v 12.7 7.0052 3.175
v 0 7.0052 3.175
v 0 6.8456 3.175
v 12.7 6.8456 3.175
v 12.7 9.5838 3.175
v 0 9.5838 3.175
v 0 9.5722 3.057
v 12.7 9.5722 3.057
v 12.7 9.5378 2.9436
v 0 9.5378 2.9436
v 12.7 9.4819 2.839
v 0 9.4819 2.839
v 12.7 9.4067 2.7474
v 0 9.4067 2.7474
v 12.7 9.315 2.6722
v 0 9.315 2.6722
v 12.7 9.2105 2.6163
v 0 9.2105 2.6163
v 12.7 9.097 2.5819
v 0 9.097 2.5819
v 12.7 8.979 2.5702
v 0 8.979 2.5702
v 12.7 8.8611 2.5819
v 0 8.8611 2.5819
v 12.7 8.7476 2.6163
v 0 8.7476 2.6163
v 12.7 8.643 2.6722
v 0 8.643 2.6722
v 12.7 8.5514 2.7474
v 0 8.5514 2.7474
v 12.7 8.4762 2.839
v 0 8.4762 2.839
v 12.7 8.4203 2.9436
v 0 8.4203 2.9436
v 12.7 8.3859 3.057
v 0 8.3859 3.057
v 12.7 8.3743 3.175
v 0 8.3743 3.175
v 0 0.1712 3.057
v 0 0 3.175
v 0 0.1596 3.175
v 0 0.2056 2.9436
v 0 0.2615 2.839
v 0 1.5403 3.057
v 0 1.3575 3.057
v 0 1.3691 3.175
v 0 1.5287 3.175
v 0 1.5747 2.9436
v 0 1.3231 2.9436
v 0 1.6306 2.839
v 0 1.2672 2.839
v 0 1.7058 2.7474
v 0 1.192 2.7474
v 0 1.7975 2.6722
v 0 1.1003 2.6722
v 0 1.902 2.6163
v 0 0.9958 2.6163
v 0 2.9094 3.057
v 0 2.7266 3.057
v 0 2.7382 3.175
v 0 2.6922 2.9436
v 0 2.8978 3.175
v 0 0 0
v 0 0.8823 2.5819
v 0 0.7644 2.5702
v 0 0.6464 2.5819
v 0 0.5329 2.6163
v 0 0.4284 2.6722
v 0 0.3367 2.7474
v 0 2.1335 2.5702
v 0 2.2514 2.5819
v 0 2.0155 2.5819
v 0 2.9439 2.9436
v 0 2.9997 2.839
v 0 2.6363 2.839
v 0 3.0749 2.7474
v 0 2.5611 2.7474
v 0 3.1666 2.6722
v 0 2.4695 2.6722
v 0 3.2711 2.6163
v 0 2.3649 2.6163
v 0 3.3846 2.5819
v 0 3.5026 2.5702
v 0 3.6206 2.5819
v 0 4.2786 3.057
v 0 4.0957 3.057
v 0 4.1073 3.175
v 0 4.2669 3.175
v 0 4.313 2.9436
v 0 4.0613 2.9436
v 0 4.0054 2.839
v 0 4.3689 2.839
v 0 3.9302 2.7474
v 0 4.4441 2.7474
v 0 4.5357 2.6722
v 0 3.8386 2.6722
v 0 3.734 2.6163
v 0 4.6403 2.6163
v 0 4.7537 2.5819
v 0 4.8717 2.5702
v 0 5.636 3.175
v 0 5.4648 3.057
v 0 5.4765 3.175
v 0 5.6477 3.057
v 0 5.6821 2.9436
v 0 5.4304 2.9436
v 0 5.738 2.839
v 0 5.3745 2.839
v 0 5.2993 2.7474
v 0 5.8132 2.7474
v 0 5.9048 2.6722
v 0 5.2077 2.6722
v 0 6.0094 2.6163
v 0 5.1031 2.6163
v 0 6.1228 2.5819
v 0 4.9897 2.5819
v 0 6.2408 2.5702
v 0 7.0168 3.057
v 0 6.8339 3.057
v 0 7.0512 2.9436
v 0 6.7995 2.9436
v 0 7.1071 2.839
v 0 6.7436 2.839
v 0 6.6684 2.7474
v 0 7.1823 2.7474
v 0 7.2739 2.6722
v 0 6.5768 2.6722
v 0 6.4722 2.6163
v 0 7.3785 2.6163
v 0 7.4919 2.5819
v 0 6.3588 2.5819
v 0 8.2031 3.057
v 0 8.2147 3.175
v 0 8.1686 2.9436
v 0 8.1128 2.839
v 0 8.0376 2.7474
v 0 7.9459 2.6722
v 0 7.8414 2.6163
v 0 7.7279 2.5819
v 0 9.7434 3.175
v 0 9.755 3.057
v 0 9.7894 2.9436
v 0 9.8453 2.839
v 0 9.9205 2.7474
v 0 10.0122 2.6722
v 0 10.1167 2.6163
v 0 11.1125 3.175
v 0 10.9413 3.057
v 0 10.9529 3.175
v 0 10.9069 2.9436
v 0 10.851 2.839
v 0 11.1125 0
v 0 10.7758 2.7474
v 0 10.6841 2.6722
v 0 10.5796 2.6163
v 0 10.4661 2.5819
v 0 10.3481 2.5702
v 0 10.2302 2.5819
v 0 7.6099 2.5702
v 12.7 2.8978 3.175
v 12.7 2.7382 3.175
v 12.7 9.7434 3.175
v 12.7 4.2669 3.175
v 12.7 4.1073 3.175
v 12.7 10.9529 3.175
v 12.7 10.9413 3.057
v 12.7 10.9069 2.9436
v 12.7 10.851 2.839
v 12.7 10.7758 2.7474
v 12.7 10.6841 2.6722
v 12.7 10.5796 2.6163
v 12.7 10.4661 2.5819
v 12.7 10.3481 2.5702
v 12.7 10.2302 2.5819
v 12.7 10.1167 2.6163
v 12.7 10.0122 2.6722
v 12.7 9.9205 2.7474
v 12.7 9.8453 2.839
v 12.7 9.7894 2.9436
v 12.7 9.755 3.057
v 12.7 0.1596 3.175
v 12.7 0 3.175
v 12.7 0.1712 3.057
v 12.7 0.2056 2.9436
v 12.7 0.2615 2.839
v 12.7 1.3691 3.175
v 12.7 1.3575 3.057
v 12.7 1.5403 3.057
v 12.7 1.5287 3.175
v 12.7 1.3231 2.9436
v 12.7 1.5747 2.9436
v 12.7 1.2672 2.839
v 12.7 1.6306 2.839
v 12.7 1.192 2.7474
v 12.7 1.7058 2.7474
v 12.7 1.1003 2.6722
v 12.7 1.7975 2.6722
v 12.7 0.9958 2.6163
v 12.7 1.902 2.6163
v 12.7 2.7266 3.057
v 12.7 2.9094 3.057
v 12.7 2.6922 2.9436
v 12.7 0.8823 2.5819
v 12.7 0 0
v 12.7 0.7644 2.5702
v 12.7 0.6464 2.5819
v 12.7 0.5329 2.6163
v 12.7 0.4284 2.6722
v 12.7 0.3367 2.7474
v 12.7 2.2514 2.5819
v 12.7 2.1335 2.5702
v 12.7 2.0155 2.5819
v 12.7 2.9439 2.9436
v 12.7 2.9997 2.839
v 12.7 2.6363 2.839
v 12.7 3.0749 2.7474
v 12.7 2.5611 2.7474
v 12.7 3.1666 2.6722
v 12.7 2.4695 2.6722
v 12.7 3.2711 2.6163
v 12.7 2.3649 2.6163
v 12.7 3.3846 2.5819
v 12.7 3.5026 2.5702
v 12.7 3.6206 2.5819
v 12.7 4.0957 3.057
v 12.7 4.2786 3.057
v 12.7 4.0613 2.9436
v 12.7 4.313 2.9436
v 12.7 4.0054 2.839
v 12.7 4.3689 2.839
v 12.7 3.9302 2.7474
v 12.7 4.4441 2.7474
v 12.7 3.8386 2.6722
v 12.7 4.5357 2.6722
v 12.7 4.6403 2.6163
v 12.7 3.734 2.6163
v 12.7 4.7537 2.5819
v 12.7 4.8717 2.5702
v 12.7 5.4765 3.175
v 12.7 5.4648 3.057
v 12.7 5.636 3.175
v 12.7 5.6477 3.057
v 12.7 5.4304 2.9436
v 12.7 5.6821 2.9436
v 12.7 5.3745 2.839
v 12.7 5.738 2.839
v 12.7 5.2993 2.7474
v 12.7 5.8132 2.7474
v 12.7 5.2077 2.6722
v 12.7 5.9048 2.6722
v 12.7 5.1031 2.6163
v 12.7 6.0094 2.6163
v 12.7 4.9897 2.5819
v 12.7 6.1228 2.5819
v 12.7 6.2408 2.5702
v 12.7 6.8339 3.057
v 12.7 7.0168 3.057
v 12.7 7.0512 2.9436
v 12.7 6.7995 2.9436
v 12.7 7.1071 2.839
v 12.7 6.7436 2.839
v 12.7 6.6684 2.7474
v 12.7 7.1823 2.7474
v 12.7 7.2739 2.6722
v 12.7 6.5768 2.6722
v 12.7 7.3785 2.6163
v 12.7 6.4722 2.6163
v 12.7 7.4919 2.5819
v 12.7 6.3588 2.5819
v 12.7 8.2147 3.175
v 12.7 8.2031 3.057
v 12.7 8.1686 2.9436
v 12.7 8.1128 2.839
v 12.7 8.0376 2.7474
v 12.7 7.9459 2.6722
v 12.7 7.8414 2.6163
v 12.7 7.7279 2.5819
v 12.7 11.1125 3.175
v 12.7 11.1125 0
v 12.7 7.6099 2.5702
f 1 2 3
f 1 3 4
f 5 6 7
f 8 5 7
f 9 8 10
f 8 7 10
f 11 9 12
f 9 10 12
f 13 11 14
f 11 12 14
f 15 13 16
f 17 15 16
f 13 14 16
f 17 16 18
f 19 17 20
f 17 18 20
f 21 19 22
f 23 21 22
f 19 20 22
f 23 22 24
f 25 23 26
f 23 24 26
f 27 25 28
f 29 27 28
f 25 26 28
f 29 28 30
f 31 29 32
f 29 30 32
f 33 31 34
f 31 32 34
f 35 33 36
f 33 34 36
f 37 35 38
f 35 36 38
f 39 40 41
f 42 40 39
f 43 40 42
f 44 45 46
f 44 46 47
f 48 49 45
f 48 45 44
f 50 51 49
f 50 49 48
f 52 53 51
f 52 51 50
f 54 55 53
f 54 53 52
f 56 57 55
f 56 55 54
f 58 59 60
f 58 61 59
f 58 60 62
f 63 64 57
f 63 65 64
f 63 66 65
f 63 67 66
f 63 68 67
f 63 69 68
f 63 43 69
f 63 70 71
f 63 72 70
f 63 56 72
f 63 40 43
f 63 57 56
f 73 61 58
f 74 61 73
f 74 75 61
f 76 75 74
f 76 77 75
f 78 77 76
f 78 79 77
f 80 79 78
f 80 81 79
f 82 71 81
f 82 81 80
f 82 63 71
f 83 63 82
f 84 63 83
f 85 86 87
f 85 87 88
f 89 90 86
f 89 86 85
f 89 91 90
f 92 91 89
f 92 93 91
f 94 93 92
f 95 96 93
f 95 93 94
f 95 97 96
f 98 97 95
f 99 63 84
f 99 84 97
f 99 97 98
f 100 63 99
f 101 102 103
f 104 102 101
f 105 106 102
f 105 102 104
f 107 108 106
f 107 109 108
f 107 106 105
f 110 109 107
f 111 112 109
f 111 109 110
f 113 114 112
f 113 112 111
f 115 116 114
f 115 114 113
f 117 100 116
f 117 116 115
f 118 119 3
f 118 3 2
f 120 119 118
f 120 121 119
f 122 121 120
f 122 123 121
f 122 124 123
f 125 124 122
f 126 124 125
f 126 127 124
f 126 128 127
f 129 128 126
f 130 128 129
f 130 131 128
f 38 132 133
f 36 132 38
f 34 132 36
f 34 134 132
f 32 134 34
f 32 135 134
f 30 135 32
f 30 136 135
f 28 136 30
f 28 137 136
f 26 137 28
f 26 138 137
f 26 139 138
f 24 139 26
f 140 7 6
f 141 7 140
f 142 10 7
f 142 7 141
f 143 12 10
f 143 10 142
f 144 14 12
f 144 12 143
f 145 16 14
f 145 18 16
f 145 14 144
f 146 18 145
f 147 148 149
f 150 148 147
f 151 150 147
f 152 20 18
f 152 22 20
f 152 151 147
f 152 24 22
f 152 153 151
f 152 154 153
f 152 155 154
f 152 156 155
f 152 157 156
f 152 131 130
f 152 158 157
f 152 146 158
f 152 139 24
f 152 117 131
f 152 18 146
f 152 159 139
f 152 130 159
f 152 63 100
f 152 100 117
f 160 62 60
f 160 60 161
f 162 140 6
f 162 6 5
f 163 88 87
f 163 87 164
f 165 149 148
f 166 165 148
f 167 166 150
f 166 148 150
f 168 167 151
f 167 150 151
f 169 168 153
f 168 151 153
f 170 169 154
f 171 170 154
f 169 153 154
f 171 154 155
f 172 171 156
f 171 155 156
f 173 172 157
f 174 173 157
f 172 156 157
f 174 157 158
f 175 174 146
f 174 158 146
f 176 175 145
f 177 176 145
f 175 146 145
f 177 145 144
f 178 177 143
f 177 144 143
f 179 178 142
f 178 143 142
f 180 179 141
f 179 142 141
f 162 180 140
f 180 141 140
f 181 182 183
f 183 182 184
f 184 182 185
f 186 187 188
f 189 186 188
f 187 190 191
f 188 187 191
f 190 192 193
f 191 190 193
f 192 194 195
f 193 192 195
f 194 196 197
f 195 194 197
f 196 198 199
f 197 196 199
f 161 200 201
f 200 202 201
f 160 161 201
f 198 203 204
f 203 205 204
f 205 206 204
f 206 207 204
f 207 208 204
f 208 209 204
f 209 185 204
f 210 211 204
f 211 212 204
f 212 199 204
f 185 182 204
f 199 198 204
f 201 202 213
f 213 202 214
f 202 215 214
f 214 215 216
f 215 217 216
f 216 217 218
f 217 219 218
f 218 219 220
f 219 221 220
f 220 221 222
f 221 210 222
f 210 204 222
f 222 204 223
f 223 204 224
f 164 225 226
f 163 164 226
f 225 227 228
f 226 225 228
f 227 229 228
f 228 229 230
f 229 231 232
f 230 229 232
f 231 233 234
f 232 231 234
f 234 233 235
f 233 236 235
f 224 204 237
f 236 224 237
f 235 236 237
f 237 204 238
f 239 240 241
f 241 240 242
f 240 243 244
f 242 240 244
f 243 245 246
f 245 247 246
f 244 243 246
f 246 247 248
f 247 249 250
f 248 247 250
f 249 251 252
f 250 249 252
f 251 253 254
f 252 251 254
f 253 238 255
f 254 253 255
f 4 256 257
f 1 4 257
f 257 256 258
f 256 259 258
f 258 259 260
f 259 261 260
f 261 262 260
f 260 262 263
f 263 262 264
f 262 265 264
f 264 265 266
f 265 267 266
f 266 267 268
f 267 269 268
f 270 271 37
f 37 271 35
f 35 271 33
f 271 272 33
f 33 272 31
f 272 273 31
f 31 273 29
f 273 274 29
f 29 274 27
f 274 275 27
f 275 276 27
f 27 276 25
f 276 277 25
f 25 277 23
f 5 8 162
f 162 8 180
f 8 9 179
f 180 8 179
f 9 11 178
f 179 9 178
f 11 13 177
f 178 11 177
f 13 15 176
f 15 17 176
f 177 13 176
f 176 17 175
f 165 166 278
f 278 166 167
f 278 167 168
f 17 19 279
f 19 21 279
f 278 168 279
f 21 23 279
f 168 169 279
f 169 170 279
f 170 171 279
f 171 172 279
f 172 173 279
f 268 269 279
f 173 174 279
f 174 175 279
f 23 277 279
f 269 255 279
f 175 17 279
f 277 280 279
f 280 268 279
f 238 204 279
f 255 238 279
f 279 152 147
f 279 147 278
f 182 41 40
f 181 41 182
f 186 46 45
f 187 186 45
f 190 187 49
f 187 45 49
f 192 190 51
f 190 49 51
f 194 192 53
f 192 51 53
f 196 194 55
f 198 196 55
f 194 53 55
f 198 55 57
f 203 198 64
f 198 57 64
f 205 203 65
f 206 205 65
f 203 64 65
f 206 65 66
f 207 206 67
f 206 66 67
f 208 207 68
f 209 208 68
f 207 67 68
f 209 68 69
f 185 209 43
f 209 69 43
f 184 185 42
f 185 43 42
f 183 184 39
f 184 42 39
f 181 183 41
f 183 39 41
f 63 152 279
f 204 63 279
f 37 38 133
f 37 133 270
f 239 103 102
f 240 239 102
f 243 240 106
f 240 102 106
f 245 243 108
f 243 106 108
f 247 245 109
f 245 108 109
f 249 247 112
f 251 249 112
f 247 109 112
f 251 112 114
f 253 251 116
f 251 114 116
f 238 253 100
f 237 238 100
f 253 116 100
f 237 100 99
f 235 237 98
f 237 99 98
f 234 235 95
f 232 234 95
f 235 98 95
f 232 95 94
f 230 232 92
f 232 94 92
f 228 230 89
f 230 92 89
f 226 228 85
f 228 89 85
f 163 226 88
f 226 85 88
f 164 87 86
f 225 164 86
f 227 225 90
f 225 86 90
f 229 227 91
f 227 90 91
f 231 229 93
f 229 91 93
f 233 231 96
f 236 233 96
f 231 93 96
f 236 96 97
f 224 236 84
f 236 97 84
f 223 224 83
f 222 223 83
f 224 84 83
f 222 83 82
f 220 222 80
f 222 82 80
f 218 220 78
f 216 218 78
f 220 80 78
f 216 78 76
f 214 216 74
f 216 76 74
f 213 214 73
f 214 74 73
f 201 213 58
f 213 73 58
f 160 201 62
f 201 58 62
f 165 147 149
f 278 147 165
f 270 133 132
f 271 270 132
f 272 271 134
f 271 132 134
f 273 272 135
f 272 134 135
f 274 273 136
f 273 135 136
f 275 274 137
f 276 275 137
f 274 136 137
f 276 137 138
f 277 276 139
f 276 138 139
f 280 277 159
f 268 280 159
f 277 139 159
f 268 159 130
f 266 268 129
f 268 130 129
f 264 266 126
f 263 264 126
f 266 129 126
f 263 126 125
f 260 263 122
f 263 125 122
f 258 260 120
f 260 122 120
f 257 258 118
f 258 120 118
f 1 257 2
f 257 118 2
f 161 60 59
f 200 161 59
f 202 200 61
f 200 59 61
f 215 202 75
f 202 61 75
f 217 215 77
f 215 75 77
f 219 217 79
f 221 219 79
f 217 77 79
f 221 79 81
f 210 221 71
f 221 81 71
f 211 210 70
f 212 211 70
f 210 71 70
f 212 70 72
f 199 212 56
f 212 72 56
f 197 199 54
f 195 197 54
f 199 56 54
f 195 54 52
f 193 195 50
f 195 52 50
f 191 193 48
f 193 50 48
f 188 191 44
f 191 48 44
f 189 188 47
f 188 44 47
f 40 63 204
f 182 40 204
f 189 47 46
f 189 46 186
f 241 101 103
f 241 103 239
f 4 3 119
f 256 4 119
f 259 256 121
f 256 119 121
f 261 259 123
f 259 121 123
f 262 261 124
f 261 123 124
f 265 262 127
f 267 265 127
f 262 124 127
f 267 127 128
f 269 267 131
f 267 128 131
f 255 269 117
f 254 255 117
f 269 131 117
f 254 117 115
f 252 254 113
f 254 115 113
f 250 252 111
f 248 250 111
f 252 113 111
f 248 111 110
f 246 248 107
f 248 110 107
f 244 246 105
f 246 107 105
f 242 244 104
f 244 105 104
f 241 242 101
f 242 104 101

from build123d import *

# Parameters (mm, degrees)
F0_W     = 12.7
F0_H     = 11.1125
F1_DEPTH = 6.35
F2_R     = 0.6047619048
F3_DEPTH = 12.701
F4_DEPTH = 3.175


# Not quite as in the source:
# - a length typed as a fraction of an inch, garbled in the dataset ("3 / 203.2 mm" for 3/8 in), is restored


with BuildPart() as f1:
    # F0 (on Top) → F1 (new body)
    with BuildSketch(Plane.XY):
        with Locations((6.35, 5.55625)):
            Rectangle(F0_W, F0_H)
    extrude(amount=F1_DEPTH)

    # F2 (on face) → F3 (cut, through all)
    with BuildSketch(Plane(origin=(0, 0, 0), x_dir=(0, -1, 0), z_dir=(-1, 0, 0))):
        with Locations((-10.3481481481, 3.175)):
            Circle(F2_R)
        with Locations((-8.9790343915, 3.175)):
            Circle(F2_R)
        with Locations((-7.6099206349, 3.175)):
            Circle(F2_R)
        with Locations((-6.2408068783, 3.175)):
            Circle(F2_R)
        with Locations((-4.8716931217, 3.175)):
            Circle(F2_R)
        with Locations((-3.5025793651, 3.175)):
            Circle(F2_R)
        with Locations((-2.1334656085, 3.175)):
            Circle(F2_R)
        with Locations((-0.7643518519, 3.175)):
            Circle(F2_R)
    extrude(amount=-F3_DEPTH, mode=Mode.SUBTRACT)

    # F4 (cut): a face of the model
    f4_faces = [f1.faces().sort_by_distance(p)[0] for p in [
        (6.35, 5.55625, 6.35),
    ]]
    extrude(f4_faces, amount=-F4_DEPTH, mode=Mode.SUBTRACT)


solid = f1.part
